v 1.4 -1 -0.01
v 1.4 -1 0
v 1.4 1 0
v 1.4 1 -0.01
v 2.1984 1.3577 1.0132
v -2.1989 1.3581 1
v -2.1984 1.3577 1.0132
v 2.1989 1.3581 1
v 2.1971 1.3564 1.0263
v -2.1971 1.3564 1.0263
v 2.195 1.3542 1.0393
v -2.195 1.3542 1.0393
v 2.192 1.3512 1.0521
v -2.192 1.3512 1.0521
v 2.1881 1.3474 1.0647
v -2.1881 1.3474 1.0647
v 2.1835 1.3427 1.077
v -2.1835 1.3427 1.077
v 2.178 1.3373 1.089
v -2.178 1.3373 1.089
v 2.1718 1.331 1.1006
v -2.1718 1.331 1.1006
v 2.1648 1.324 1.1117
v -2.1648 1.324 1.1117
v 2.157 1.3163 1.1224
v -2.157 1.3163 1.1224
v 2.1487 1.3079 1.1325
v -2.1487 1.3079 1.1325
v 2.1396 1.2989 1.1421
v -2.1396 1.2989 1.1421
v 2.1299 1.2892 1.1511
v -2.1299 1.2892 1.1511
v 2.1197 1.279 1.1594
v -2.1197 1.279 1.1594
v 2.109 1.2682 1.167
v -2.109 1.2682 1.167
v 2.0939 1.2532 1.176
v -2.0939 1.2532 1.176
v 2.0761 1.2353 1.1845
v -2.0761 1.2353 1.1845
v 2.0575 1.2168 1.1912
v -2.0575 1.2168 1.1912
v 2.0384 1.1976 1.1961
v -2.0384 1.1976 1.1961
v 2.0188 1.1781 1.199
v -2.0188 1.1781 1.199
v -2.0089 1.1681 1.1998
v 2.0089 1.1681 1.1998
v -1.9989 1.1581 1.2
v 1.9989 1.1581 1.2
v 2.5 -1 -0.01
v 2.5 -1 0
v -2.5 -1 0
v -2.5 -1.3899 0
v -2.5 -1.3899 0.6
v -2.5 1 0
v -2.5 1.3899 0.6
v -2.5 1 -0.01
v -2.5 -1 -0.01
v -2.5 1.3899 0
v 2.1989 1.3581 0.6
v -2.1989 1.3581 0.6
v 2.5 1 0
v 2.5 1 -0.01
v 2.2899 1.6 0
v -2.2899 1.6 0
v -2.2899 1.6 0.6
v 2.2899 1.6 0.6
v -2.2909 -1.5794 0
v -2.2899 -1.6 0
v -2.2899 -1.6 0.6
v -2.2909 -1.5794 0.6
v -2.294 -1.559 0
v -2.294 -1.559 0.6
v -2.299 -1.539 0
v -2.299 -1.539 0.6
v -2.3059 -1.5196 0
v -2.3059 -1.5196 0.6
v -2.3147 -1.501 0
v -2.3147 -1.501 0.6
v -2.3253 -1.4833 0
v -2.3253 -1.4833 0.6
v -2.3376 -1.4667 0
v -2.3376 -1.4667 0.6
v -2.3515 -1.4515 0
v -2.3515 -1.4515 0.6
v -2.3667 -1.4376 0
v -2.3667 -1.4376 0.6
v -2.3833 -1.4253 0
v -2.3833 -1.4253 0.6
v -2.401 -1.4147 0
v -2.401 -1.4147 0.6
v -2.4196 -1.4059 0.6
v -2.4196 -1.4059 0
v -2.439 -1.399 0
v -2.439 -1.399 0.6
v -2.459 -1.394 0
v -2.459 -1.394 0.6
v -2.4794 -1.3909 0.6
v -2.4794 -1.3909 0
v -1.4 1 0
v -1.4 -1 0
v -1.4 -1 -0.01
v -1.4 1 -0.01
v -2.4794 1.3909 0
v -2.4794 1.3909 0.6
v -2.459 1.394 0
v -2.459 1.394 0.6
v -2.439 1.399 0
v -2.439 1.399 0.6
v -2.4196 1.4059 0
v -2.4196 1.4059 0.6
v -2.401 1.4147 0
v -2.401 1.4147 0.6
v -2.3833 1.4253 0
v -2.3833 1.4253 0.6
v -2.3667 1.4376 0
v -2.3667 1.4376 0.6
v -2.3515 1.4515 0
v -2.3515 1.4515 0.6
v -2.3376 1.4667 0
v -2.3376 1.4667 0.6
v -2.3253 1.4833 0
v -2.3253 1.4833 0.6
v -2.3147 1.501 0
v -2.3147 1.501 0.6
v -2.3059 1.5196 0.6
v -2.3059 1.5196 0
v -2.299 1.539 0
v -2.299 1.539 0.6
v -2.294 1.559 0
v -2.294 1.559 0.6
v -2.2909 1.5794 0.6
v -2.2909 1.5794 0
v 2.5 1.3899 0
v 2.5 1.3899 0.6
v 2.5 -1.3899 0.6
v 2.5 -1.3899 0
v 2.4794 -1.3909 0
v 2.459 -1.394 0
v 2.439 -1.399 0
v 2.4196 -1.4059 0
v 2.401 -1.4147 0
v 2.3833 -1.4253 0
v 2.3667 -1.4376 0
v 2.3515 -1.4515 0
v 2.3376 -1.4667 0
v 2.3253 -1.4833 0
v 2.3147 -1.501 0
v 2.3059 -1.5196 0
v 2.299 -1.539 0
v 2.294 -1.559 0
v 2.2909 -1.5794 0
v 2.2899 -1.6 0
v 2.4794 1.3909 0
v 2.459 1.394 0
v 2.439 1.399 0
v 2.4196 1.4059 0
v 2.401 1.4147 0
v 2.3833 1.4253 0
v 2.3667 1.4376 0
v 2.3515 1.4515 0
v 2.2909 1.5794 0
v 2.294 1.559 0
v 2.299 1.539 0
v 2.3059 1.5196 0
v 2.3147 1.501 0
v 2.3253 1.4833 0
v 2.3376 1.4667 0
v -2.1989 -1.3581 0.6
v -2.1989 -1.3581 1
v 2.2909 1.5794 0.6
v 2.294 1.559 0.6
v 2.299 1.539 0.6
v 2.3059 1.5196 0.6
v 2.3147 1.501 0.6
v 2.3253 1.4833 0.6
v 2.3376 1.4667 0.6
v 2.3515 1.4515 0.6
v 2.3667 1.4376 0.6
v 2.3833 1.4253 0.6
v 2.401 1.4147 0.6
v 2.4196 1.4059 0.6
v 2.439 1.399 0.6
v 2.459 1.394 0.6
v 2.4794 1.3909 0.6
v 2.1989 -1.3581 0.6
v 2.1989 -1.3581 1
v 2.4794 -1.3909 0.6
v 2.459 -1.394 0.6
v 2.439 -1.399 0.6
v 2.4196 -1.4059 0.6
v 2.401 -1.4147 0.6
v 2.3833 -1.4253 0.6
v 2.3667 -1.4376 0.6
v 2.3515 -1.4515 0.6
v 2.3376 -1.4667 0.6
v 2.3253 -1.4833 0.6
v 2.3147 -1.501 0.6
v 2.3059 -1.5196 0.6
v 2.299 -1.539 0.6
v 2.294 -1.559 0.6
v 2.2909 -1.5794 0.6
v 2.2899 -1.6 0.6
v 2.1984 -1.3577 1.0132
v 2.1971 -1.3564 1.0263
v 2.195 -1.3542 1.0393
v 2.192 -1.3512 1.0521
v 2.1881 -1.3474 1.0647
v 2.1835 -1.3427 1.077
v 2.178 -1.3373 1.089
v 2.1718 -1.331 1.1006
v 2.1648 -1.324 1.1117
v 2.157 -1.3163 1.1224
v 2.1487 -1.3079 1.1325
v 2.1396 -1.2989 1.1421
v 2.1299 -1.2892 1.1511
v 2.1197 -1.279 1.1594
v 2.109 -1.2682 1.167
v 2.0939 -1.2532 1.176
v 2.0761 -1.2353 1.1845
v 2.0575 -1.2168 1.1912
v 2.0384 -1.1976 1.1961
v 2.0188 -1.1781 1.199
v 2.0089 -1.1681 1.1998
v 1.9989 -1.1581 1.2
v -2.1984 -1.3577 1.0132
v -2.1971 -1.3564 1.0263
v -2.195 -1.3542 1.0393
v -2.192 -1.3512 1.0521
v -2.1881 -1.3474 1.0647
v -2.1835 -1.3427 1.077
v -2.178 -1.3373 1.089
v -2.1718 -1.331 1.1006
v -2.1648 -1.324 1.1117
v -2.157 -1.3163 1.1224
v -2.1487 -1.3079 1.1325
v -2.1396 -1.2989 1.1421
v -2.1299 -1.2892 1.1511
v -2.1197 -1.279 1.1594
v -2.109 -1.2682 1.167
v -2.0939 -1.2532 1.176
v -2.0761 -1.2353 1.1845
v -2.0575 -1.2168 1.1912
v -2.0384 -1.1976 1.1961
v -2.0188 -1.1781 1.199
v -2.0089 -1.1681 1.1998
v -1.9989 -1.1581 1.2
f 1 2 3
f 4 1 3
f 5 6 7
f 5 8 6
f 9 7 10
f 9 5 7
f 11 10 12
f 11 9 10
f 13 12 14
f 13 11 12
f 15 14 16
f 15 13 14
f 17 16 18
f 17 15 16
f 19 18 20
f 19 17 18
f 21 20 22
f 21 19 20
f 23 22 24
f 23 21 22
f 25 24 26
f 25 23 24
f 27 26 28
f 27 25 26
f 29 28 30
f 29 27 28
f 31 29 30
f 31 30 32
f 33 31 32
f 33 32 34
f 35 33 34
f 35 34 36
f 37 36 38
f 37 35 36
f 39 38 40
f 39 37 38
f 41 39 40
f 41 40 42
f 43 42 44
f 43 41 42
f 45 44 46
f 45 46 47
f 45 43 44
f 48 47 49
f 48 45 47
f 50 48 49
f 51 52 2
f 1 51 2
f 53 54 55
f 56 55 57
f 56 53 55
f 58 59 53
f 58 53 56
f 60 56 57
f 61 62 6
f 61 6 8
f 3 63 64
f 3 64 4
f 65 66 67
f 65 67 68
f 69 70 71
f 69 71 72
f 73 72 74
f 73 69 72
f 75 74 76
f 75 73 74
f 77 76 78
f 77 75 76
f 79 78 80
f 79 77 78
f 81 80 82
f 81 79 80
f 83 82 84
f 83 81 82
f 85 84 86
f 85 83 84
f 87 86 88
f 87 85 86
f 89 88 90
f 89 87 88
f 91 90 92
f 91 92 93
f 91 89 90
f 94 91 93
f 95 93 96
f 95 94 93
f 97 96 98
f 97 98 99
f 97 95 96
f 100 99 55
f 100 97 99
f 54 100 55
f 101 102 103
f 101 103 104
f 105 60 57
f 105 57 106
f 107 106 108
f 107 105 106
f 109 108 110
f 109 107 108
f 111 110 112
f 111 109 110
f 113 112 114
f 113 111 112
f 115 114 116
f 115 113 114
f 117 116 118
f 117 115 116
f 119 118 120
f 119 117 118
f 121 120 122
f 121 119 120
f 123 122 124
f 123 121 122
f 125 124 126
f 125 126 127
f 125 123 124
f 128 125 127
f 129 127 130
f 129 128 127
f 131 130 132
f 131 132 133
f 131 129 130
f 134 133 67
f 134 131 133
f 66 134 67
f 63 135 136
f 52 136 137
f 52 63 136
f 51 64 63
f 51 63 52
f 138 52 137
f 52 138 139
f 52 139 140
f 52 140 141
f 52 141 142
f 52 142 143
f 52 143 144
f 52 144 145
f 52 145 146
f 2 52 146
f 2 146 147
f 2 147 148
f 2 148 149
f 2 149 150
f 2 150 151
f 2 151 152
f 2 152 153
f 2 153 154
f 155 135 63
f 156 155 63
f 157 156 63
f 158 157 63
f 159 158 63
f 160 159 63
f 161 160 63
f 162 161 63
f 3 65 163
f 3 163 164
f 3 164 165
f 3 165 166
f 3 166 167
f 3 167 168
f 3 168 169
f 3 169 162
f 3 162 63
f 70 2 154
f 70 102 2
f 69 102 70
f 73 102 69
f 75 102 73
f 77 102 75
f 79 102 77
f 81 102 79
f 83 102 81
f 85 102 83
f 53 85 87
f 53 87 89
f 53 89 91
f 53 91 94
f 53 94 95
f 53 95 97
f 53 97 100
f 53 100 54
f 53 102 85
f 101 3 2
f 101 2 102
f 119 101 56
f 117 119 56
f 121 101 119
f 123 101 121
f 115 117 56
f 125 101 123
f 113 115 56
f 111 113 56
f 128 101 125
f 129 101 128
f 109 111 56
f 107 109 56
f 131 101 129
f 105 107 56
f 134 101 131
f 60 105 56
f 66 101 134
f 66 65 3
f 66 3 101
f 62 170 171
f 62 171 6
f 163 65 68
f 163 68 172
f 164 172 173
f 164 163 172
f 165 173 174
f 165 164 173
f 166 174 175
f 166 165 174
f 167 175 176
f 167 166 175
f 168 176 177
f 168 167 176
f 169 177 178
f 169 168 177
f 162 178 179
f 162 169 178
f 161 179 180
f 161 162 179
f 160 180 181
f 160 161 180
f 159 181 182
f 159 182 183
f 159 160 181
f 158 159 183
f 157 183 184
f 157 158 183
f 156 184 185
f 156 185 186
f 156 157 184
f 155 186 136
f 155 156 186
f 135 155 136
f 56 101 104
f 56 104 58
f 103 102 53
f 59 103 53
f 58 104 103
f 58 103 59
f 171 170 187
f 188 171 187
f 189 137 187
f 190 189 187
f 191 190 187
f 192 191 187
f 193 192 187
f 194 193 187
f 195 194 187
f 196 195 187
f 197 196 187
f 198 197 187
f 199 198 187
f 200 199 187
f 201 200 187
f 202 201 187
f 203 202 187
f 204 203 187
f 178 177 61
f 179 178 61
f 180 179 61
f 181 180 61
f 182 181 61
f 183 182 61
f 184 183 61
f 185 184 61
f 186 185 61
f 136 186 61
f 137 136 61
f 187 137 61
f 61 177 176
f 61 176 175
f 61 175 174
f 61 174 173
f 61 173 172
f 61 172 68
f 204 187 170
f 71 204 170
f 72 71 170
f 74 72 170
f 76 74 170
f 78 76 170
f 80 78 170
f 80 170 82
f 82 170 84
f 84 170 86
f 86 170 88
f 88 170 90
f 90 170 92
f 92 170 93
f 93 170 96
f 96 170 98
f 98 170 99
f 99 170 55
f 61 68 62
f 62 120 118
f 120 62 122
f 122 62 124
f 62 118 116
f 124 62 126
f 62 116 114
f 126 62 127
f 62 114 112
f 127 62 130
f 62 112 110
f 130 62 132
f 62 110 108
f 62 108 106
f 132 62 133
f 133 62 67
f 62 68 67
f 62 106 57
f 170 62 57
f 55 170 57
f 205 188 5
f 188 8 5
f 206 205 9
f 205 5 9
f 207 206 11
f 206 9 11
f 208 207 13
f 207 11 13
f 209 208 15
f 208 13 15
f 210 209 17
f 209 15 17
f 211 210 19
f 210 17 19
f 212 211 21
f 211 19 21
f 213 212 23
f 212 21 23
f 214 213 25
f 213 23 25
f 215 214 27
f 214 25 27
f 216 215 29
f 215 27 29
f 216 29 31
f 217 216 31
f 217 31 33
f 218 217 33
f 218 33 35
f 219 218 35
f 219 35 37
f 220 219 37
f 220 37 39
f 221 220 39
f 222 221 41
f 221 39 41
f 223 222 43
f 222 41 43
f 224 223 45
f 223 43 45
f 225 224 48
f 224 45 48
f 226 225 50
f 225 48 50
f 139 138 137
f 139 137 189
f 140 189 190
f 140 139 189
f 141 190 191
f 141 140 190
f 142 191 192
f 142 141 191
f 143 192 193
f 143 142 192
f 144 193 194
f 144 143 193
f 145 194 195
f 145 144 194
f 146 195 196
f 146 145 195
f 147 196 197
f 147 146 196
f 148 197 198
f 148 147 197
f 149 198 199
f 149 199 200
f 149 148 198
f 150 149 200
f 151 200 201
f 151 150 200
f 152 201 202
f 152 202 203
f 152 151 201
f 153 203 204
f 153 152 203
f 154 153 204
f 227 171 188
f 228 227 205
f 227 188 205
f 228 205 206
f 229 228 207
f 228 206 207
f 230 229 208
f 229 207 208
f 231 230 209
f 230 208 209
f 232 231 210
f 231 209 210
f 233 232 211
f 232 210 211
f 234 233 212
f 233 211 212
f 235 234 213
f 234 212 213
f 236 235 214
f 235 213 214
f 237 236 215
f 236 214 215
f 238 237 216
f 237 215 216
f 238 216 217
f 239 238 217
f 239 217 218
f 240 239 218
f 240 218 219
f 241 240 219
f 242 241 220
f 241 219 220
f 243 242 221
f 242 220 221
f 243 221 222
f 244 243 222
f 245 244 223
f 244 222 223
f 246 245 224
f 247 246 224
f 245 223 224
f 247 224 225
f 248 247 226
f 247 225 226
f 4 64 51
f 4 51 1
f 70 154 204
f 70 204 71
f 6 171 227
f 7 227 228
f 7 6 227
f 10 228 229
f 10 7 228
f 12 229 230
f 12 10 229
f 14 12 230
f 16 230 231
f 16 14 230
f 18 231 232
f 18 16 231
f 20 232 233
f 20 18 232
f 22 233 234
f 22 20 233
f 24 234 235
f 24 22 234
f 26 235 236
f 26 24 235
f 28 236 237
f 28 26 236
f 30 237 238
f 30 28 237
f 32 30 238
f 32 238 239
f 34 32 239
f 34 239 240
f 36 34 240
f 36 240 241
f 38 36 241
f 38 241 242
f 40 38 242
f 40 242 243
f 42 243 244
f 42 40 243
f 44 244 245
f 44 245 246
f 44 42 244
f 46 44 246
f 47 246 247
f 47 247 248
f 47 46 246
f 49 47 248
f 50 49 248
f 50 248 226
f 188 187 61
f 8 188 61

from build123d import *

# Parameters (mm, degrees)
BOSS_EXTRUDE1_DEPTH = 0.6
SKETCH2_W           = 4.397756064
SKETCH2_H           = 2.716261098
BOSS_EXTRUDE2_DEPTH = 0.6
SKETCH3_W           = 1.1
SKETCH3_H           = 2
BOSS_EXTRUDE3_DEPTH = 0.01
FILLET1_R           = 0.2


with BuildPart() as part:
    # Sketch1 → Boss-Extrude1 (new body)
    with BuildSketch(Plane.XY):
        with BuildLine():
            Line((-2.289923712, 1.6), (2.289923712, 1.6))
            ThreePointArc((2.289923712, 1.6), (2.351453632, 1.451453632), (2.5, 1.389923712))
            Line((2.5, 1.389923712), (2.5, -1.389923712))
            ThreePointArc((2.5, -1.389923712), (2.351453632, -1.451453632), (2.289923712, -1.6))
            Line((2.289923712, -1.6), (-2.289923712, -1.6))
            ThreePointArc((-2.289923712, -1.6), (-2.351453632, -1.451453632), (-2.5, -1.389923712))
            Line((-2.5, -1.389923712), (-2.5, 1.389923712))
            ThreePointArc((-2.5, 1.389923712), (-2.351453632, 1.451453632), (-2.289923712, 1.6))
        make_face()
    extrude(amount=BOSS_EXTRUDE1_DEPTH)

    # Sketch2 → Boss-Extrude2 (add)
    with BuildSketch(Plane.XY.offset(0.6)):
        Rectangle(SKETCH2_W, SKETCH2_H)
    extrude(amount=BOSS_EXTRUDE2_DEPTH)

    # Sketch3 → Boss-Extrude3 (add)
    with BuildSketch(Plane(origin=(0, 0, 0), x_dir=(-1, 0, 0), z_dir=(0, 0, -1))):
        with Locations((-1.95, 0)):
            Rectangle(SKETCH3_W, SKETCH3_H)
        with Locations((1.95, 0)):
            Rectangle(SKETCH3_W, SKETCH3_H)
    extrude(amount=BOSS_EXTRUDE3_DEPTH)

    # Fillet1
    fillet1_edges = [part.edges().sort_by_distance(p)[0] for p in [
        (2.198878032, 0, 1.2),
        (0, 1.358130549, 1.2),
        (-2.198878032, 0, 1.2),
        (0, -1.358130549, 1.2),
    ]]
    fillet(fillet1_edges, radius=FILLET1_R)


solid = part.part
